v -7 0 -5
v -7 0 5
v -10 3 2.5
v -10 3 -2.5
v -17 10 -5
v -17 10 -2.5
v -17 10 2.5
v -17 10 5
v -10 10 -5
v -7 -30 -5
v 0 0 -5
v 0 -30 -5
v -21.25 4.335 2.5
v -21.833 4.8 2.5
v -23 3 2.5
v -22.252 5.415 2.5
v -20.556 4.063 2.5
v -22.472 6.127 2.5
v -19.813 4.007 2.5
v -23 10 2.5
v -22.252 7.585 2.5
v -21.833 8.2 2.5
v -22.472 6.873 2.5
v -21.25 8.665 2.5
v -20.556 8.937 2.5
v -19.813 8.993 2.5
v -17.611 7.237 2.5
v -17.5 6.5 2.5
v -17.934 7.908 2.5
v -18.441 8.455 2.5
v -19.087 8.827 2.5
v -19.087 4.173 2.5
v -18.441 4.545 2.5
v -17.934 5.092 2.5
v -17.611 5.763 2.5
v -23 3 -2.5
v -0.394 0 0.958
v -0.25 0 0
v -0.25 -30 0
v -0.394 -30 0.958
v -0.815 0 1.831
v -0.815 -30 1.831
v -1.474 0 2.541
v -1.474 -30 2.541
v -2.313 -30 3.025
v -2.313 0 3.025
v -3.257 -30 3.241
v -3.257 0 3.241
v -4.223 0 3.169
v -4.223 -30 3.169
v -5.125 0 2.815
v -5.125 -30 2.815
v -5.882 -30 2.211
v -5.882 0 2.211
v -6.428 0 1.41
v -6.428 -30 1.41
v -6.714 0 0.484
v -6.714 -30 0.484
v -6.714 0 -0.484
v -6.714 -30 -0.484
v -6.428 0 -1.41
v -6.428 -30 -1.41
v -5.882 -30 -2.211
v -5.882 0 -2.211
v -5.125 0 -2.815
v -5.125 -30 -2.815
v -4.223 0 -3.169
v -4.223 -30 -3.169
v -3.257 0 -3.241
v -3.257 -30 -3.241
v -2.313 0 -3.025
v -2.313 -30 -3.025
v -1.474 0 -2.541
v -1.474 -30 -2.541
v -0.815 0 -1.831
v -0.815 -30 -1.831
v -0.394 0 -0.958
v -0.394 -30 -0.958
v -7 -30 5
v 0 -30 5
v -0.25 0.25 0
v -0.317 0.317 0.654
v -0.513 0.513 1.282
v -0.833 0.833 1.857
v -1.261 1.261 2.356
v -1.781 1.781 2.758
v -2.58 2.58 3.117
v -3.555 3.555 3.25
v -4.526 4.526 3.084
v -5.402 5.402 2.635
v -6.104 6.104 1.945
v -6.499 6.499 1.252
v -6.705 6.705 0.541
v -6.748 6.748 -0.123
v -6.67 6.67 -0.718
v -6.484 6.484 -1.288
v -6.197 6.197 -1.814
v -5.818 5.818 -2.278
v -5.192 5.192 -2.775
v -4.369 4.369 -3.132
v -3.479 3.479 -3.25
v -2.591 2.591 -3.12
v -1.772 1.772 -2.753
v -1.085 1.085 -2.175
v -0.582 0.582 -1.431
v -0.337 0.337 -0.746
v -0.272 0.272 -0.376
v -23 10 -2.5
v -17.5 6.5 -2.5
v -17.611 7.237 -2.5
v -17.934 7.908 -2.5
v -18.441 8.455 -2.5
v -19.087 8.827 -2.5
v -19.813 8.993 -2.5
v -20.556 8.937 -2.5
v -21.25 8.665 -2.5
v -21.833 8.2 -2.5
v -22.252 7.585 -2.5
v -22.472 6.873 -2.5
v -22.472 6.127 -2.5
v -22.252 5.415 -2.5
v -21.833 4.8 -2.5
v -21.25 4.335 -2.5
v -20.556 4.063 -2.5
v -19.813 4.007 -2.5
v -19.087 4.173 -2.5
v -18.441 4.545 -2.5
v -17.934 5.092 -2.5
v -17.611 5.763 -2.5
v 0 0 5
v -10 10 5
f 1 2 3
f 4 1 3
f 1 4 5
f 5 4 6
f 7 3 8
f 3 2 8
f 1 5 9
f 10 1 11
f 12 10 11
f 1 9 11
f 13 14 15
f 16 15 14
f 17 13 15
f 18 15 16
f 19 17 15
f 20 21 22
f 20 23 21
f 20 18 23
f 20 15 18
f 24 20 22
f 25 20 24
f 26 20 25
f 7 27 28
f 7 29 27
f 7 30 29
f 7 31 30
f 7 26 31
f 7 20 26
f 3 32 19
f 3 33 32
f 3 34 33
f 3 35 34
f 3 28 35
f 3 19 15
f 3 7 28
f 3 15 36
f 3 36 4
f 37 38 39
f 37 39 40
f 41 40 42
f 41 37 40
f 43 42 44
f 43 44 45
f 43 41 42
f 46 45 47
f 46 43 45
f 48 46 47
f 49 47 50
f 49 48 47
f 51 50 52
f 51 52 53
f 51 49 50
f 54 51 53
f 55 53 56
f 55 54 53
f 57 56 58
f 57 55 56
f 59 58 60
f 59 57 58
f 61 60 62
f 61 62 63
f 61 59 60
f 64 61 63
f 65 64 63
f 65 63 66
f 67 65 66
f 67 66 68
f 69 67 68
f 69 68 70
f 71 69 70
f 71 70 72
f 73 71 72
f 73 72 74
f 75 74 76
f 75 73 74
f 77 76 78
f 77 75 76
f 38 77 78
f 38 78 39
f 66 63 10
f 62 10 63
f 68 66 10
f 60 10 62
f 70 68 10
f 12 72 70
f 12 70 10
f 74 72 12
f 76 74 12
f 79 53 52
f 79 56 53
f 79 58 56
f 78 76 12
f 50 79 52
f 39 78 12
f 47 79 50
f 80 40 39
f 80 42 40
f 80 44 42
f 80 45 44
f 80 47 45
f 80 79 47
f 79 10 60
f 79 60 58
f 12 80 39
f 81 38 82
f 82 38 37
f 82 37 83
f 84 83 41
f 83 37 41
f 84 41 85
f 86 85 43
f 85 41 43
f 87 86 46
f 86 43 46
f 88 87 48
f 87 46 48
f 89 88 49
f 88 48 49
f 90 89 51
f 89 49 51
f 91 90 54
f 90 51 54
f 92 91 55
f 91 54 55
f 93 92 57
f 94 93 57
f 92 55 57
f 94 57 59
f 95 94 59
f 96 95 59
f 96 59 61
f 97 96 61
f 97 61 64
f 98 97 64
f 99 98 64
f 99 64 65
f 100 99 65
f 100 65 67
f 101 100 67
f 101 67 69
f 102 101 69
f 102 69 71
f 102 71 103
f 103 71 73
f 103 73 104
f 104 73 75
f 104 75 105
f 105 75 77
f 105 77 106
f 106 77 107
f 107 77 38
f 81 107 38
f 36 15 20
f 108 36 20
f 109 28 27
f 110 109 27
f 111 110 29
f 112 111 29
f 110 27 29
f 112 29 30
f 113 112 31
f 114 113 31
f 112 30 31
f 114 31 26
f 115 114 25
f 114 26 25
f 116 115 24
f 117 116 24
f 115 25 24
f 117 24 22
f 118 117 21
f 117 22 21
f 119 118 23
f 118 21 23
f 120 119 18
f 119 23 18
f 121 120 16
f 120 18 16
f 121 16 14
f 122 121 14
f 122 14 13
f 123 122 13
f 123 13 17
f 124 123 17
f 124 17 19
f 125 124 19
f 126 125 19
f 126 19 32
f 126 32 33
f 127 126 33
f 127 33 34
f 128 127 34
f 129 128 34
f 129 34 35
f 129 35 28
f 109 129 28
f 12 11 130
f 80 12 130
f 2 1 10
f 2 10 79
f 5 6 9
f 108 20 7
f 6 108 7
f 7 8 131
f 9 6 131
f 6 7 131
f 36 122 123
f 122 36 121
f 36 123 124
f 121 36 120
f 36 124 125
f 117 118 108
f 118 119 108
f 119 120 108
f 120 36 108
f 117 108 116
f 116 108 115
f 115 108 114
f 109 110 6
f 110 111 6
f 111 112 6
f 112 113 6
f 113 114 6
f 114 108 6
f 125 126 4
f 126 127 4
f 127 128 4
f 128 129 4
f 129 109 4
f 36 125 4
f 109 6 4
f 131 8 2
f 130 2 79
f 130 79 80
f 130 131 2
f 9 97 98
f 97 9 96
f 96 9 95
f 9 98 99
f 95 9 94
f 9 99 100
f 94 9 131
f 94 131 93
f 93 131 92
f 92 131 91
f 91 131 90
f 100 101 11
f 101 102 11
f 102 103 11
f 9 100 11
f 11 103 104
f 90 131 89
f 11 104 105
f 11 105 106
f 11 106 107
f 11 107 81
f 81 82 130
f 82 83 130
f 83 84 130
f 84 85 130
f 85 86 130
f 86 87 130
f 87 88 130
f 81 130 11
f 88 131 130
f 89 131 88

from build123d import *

# Parameters (mm, degrees)
BOSS_EXTRUDE2_DEPTH = 5
SKETCH3_R           = 3.25
CUT_EXTRUDE1_DEPTH  = 11
SKETCH4_W           = 13
SKETCH4_H           = 7
BOSS_EXTRUDE3_DEPTH = 2.5
SKETCH5_R           = 2.5
CUT_EXTRUDE2_DEPTH  = 8.5
SKETCH6_W           = 7
SKETCH6_H           = 10
SKETCH6_R           = 3.25
BOSS_EXTRUDE4_DEPTH = 30


with BuildPart() as part:
    # Sketch2 → Boss-Extrude2 (new body, symmetric)
    with BuildSketch(Plane.XY):
        Polygon((0, 0), (-7, 0), (-17, 10), (-10, 10), align=None)
    extrude(amount=BOSS_EXTRUDE2_DEPTH, both=True)

    # Sketch3 → Cut-Extrude1 (cut, through all)
    with BuildSketch(Plane.XZ):
        with Locations((-3.5, 0)):
            Circle(SKETCH3_R)
    extrude(amount=-CUT_EXTRUDE1_DEPTH, mode=Mode.SUBTRACT)

    # Sketch4 → Boss-Extrude3 (add, symmetric)
    with BuildSketch(Plane.XY):
        with Locations((-16.5, 6.5)):
            Rectangle(SKETCH4_W, SKETCH4_H)
    extrude(amount=BOSS_EXTRUDE3_DEPTH, both=True)

    # Sketch5 → Cut-Extrude2 (cut, through all)
    with BuildSketch(Plane.XY.offset(2.5)):
        with Locations((-20, 6.5)):
            Circle(SKETCH5_R)
    extrude(amount=-CUT_EXTRUDE2_DEPTH, mode=Mode.SUBTRACT)

    # Sketch6 → Boss-Extrude4 (add)
    with BuildSketch(Plane.XZ):
        with Locations((-3.5, 0)):
            Rectangle(SKETCH6_W, SKETCH6_H)
        with Locations((-3.5, 0)):
            Circle(SKETCH6_R, mode=Mode.SUBTRACT)
    extrude(amount=BOSS_EXTRUDE4_DEPTH)


solid = part.part
